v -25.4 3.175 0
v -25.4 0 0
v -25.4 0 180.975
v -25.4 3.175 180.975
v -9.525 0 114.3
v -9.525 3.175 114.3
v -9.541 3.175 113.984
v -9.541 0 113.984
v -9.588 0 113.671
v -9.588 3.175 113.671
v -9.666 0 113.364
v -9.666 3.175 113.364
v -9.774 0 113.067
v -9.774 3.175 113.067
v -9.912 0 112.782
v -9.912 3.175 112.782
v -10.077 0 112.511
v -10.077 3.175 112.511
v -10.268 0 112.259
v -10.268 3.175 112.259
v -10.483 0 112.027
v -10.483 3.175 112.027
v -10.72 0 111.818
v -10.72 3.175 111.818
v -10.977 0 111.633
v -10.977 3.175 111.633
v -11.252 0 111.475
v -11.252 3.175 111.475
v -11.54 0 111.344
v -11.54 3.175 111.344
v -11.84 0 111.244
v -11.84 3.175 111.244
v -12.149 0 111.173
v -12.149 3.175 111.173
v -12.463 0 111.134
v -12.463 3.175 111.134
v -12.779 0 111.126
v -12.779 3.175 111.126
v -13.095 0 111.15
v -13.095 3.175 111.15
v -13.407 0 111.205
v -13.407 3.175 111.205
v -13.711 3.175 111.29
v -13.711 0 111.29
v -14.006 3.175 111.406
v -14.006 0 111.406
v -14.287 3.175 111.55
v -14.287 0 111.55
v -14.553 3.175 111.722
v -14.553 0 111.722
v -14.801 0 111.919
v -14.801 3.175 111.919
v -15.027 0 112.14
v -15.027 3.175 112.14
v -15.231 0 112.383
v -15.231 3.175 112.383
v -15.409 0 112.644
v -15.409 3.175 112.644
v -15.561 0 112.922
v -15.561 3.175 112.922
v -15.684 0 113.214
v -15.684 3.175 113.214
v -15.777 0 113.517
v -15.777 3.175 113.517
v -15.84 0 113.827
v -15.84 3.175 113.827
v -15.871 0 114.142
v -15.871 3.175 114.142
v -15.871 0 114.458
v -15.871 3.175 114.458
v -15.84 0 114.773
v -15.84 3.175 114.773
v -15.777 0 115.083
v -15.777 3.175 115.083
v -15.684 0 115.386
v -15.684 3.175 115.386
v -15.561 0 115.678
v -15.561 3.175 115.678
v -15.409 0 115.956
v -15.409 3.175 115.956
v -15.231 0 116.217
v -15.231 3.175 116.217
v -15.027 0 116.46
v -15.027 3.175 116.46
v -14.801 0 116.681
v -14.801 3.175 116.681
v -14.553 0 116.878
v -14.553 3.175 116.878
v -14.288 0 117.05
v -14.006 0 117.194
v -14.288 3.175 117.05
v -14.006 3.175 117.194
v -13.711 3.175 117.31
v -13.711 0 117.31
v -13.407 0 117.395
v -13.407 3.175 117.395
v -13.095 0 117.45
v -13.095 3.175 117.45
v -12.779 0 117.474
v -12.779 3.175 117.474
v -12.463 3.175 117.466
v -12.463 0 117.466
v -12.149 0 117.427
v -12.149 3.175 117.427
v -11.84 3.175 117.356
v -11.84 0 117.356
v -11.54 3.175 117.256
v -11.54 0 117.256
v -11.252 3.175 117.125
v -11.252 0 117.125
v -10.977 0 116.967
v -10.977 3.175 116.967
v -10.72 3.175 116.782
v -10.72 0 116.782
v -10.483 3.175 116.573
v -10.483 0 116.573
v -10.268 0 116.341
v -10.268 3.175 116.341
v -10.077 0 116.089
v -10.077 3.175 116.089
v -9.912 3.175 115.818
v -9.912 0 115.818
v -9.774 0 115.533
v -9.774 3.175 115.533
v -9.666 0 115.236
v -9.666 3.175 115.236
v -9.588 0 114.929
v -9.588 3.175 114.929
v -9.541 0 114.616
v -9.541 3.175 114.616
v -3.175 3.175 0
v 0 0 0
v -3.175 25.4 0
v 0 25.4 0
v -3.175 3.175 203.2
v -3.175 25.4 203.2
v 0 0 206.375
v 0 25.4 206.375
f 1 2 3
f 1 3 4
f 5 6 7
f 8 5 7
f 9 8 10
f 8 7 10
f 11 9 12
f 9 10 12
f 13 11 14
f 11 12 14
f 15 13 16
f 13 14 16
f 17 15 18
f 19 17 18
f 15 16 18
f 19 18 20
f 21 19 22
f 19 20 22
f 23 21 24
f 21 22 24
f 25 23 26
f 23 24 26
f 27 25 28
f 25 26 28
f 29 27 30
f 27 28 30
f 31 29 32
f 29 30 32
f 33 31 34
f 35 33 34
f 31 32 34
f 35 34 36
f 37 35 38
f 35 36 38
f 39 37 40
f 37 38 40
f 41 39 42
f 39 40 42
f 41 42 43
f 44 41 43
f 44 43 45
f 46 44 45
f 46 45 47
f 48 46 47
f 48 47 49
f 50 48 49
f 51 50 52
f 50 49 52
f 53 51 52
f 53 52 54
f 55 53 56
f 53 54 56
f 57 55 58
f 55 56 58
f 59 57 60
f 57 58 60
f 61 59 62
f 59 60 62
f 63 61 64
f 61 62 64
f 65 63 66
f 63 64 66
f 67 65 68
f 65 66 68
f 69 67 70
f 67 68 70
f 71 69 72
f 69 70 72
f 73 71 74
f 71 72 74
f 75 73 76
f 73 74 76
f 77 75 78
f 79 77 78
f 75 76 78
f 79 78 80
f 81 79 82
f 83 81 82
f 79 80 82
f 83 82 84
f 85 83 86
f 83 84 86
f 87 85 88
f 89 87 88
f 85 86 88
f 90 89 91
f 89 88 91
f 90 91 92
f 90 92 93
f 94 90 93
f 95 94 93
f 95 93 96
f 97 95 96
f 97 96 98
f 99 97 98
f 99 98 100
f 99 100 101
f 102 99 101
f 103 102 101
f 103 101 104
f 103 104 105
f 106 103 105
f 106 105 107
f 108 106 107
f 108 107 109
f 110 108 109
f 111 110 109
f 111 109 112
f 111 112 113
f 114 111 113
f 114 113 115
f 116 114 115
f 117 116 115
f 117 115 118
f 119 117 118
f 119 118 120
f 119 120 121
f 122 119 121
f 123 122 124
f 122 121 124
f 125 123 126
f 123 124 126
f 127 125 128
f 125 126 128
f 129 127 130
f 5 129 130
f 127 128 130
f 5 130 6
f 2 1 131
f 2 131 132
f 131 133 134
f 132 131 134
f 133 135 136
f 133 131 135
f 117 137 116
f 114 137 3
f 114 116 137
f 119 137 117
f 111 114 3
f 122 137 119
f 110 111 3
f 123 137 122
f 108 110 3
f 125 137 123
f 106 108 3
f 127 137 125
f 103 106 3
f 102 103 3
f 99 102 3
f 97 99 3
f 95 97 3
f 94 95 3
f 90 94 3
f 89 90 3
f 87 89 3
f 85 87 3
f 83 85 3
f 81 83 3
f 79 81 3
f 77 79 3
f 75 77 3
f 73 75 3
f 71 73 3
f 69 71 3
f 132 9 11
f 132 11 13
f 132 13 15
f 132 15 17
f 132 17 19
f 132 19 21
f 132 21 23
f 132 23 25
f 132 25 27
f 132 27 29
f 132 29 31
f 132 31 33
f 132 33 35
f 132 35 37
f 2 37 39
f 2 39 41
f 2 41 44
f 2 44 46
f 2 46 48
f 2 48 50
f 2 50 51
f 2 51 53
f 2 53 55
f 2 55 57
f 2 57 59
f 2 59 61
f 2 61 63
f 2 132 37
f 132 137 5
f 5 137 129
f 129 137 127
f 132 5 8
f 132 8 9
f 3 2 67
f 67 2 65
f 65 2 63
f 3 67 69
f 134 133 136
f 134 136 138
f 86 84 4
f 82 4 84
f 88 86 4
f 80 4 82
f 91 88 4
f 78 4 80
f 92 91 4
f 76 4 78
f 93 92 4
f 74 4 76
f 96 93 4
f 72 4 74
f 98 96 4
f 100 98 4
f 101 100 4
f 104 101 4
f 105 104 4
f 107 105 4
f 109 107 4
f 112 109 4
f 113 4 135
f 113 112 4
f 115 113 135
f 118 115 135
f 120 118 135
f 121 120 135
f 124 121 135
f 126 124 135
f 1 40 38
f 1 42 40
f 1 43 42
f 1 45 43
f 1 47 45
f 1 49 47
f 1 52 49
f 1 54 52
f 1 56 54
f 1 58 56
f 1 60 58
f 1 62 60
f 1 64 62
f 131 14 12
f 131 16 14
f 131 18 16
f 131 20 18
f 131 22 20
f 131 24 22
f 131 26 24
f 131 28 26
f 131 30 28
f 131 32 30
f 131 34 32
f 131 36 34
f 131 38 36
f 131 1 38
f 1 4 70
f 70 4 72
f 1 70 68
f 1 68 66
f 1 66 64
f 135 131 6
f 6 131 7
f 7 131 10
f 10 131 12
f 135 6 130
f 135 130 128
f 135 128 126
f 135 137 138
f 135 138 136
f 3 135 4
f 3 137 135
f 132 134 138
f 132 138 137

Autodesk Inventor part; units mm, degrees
ref_plane "YZ Plane" through (0, 0, 0) normal (1, 0, 0) x (0, 1, 0)
ref_plane "XZ Plane" through (0, 0, 0) normal (0, 1, 0) x (-1, 0, 0)
ref_plane "XY Plane" through (0, 0, 0) normal (0, 0, 1) x (1, 0, 0)
sketch "Sketch1" plane through (0, 0, 0) normal (0, 0, 1) x (1, 0, 0)
  line L0 (-25.4, 3.175) -> (-3.175, 3.175)
  line L1 (0, 0) -> (-25.4, 0)
  line L2 (-25.4, 0) -> (-25.4, 3.175)
  line L3 (-3.175, 3.175) -> (-3.175, 25.4)
  line L4 (-3.175, 25.4) -> (0, 25.4)
  line L5 (0, 25.4) -> (0, 0)
  dimension "d0" = 25.4
  dimension "d1" = 25.4
  dimension "d2" = 3.175
  dimension "d3" = 3.175
extrude "Extrusion1" add sketch "Sketch1" along normal blind 206.375
sketch "Sketch2" plane through (-25.4, 0, 0) normal (0, -1, 0) x (1, 0, 0)
  line L0 (25.4, 206.375) -> (0, 206.375) projected
  line L1 (0, 0) -> (0, 206.375) projected
  line L2 (25.4, 0) -> (25.4, 206.375) projected
  line L3 (25.4, 206.375) -> (0, 180.975)
  dimension "d6" = 45
extrude "Extrusion2" cut sketch "Sketch2" against normal blind 177.8
sketch "Sketch3" plane through (-25.4, 3.175, 0) normal (0, 1, 0) x (1, 0, 0)
  line L0 (22.225, 0) -> (22.225, -203.2) projected
  line L1 (0, 0) -> (22.225, 0) projected
  circle A0 centre (12.7, -114.3) radius 3.175
  point P0 (25.4, 0)
  dimension "d9" = 6.35
  dimension "d10" = 114.3
  dimension "d11" = 9.525
extrude "Extrusion3" cut sketch "Sketch3" against normal blind 25.4
properties part number "L frame"
